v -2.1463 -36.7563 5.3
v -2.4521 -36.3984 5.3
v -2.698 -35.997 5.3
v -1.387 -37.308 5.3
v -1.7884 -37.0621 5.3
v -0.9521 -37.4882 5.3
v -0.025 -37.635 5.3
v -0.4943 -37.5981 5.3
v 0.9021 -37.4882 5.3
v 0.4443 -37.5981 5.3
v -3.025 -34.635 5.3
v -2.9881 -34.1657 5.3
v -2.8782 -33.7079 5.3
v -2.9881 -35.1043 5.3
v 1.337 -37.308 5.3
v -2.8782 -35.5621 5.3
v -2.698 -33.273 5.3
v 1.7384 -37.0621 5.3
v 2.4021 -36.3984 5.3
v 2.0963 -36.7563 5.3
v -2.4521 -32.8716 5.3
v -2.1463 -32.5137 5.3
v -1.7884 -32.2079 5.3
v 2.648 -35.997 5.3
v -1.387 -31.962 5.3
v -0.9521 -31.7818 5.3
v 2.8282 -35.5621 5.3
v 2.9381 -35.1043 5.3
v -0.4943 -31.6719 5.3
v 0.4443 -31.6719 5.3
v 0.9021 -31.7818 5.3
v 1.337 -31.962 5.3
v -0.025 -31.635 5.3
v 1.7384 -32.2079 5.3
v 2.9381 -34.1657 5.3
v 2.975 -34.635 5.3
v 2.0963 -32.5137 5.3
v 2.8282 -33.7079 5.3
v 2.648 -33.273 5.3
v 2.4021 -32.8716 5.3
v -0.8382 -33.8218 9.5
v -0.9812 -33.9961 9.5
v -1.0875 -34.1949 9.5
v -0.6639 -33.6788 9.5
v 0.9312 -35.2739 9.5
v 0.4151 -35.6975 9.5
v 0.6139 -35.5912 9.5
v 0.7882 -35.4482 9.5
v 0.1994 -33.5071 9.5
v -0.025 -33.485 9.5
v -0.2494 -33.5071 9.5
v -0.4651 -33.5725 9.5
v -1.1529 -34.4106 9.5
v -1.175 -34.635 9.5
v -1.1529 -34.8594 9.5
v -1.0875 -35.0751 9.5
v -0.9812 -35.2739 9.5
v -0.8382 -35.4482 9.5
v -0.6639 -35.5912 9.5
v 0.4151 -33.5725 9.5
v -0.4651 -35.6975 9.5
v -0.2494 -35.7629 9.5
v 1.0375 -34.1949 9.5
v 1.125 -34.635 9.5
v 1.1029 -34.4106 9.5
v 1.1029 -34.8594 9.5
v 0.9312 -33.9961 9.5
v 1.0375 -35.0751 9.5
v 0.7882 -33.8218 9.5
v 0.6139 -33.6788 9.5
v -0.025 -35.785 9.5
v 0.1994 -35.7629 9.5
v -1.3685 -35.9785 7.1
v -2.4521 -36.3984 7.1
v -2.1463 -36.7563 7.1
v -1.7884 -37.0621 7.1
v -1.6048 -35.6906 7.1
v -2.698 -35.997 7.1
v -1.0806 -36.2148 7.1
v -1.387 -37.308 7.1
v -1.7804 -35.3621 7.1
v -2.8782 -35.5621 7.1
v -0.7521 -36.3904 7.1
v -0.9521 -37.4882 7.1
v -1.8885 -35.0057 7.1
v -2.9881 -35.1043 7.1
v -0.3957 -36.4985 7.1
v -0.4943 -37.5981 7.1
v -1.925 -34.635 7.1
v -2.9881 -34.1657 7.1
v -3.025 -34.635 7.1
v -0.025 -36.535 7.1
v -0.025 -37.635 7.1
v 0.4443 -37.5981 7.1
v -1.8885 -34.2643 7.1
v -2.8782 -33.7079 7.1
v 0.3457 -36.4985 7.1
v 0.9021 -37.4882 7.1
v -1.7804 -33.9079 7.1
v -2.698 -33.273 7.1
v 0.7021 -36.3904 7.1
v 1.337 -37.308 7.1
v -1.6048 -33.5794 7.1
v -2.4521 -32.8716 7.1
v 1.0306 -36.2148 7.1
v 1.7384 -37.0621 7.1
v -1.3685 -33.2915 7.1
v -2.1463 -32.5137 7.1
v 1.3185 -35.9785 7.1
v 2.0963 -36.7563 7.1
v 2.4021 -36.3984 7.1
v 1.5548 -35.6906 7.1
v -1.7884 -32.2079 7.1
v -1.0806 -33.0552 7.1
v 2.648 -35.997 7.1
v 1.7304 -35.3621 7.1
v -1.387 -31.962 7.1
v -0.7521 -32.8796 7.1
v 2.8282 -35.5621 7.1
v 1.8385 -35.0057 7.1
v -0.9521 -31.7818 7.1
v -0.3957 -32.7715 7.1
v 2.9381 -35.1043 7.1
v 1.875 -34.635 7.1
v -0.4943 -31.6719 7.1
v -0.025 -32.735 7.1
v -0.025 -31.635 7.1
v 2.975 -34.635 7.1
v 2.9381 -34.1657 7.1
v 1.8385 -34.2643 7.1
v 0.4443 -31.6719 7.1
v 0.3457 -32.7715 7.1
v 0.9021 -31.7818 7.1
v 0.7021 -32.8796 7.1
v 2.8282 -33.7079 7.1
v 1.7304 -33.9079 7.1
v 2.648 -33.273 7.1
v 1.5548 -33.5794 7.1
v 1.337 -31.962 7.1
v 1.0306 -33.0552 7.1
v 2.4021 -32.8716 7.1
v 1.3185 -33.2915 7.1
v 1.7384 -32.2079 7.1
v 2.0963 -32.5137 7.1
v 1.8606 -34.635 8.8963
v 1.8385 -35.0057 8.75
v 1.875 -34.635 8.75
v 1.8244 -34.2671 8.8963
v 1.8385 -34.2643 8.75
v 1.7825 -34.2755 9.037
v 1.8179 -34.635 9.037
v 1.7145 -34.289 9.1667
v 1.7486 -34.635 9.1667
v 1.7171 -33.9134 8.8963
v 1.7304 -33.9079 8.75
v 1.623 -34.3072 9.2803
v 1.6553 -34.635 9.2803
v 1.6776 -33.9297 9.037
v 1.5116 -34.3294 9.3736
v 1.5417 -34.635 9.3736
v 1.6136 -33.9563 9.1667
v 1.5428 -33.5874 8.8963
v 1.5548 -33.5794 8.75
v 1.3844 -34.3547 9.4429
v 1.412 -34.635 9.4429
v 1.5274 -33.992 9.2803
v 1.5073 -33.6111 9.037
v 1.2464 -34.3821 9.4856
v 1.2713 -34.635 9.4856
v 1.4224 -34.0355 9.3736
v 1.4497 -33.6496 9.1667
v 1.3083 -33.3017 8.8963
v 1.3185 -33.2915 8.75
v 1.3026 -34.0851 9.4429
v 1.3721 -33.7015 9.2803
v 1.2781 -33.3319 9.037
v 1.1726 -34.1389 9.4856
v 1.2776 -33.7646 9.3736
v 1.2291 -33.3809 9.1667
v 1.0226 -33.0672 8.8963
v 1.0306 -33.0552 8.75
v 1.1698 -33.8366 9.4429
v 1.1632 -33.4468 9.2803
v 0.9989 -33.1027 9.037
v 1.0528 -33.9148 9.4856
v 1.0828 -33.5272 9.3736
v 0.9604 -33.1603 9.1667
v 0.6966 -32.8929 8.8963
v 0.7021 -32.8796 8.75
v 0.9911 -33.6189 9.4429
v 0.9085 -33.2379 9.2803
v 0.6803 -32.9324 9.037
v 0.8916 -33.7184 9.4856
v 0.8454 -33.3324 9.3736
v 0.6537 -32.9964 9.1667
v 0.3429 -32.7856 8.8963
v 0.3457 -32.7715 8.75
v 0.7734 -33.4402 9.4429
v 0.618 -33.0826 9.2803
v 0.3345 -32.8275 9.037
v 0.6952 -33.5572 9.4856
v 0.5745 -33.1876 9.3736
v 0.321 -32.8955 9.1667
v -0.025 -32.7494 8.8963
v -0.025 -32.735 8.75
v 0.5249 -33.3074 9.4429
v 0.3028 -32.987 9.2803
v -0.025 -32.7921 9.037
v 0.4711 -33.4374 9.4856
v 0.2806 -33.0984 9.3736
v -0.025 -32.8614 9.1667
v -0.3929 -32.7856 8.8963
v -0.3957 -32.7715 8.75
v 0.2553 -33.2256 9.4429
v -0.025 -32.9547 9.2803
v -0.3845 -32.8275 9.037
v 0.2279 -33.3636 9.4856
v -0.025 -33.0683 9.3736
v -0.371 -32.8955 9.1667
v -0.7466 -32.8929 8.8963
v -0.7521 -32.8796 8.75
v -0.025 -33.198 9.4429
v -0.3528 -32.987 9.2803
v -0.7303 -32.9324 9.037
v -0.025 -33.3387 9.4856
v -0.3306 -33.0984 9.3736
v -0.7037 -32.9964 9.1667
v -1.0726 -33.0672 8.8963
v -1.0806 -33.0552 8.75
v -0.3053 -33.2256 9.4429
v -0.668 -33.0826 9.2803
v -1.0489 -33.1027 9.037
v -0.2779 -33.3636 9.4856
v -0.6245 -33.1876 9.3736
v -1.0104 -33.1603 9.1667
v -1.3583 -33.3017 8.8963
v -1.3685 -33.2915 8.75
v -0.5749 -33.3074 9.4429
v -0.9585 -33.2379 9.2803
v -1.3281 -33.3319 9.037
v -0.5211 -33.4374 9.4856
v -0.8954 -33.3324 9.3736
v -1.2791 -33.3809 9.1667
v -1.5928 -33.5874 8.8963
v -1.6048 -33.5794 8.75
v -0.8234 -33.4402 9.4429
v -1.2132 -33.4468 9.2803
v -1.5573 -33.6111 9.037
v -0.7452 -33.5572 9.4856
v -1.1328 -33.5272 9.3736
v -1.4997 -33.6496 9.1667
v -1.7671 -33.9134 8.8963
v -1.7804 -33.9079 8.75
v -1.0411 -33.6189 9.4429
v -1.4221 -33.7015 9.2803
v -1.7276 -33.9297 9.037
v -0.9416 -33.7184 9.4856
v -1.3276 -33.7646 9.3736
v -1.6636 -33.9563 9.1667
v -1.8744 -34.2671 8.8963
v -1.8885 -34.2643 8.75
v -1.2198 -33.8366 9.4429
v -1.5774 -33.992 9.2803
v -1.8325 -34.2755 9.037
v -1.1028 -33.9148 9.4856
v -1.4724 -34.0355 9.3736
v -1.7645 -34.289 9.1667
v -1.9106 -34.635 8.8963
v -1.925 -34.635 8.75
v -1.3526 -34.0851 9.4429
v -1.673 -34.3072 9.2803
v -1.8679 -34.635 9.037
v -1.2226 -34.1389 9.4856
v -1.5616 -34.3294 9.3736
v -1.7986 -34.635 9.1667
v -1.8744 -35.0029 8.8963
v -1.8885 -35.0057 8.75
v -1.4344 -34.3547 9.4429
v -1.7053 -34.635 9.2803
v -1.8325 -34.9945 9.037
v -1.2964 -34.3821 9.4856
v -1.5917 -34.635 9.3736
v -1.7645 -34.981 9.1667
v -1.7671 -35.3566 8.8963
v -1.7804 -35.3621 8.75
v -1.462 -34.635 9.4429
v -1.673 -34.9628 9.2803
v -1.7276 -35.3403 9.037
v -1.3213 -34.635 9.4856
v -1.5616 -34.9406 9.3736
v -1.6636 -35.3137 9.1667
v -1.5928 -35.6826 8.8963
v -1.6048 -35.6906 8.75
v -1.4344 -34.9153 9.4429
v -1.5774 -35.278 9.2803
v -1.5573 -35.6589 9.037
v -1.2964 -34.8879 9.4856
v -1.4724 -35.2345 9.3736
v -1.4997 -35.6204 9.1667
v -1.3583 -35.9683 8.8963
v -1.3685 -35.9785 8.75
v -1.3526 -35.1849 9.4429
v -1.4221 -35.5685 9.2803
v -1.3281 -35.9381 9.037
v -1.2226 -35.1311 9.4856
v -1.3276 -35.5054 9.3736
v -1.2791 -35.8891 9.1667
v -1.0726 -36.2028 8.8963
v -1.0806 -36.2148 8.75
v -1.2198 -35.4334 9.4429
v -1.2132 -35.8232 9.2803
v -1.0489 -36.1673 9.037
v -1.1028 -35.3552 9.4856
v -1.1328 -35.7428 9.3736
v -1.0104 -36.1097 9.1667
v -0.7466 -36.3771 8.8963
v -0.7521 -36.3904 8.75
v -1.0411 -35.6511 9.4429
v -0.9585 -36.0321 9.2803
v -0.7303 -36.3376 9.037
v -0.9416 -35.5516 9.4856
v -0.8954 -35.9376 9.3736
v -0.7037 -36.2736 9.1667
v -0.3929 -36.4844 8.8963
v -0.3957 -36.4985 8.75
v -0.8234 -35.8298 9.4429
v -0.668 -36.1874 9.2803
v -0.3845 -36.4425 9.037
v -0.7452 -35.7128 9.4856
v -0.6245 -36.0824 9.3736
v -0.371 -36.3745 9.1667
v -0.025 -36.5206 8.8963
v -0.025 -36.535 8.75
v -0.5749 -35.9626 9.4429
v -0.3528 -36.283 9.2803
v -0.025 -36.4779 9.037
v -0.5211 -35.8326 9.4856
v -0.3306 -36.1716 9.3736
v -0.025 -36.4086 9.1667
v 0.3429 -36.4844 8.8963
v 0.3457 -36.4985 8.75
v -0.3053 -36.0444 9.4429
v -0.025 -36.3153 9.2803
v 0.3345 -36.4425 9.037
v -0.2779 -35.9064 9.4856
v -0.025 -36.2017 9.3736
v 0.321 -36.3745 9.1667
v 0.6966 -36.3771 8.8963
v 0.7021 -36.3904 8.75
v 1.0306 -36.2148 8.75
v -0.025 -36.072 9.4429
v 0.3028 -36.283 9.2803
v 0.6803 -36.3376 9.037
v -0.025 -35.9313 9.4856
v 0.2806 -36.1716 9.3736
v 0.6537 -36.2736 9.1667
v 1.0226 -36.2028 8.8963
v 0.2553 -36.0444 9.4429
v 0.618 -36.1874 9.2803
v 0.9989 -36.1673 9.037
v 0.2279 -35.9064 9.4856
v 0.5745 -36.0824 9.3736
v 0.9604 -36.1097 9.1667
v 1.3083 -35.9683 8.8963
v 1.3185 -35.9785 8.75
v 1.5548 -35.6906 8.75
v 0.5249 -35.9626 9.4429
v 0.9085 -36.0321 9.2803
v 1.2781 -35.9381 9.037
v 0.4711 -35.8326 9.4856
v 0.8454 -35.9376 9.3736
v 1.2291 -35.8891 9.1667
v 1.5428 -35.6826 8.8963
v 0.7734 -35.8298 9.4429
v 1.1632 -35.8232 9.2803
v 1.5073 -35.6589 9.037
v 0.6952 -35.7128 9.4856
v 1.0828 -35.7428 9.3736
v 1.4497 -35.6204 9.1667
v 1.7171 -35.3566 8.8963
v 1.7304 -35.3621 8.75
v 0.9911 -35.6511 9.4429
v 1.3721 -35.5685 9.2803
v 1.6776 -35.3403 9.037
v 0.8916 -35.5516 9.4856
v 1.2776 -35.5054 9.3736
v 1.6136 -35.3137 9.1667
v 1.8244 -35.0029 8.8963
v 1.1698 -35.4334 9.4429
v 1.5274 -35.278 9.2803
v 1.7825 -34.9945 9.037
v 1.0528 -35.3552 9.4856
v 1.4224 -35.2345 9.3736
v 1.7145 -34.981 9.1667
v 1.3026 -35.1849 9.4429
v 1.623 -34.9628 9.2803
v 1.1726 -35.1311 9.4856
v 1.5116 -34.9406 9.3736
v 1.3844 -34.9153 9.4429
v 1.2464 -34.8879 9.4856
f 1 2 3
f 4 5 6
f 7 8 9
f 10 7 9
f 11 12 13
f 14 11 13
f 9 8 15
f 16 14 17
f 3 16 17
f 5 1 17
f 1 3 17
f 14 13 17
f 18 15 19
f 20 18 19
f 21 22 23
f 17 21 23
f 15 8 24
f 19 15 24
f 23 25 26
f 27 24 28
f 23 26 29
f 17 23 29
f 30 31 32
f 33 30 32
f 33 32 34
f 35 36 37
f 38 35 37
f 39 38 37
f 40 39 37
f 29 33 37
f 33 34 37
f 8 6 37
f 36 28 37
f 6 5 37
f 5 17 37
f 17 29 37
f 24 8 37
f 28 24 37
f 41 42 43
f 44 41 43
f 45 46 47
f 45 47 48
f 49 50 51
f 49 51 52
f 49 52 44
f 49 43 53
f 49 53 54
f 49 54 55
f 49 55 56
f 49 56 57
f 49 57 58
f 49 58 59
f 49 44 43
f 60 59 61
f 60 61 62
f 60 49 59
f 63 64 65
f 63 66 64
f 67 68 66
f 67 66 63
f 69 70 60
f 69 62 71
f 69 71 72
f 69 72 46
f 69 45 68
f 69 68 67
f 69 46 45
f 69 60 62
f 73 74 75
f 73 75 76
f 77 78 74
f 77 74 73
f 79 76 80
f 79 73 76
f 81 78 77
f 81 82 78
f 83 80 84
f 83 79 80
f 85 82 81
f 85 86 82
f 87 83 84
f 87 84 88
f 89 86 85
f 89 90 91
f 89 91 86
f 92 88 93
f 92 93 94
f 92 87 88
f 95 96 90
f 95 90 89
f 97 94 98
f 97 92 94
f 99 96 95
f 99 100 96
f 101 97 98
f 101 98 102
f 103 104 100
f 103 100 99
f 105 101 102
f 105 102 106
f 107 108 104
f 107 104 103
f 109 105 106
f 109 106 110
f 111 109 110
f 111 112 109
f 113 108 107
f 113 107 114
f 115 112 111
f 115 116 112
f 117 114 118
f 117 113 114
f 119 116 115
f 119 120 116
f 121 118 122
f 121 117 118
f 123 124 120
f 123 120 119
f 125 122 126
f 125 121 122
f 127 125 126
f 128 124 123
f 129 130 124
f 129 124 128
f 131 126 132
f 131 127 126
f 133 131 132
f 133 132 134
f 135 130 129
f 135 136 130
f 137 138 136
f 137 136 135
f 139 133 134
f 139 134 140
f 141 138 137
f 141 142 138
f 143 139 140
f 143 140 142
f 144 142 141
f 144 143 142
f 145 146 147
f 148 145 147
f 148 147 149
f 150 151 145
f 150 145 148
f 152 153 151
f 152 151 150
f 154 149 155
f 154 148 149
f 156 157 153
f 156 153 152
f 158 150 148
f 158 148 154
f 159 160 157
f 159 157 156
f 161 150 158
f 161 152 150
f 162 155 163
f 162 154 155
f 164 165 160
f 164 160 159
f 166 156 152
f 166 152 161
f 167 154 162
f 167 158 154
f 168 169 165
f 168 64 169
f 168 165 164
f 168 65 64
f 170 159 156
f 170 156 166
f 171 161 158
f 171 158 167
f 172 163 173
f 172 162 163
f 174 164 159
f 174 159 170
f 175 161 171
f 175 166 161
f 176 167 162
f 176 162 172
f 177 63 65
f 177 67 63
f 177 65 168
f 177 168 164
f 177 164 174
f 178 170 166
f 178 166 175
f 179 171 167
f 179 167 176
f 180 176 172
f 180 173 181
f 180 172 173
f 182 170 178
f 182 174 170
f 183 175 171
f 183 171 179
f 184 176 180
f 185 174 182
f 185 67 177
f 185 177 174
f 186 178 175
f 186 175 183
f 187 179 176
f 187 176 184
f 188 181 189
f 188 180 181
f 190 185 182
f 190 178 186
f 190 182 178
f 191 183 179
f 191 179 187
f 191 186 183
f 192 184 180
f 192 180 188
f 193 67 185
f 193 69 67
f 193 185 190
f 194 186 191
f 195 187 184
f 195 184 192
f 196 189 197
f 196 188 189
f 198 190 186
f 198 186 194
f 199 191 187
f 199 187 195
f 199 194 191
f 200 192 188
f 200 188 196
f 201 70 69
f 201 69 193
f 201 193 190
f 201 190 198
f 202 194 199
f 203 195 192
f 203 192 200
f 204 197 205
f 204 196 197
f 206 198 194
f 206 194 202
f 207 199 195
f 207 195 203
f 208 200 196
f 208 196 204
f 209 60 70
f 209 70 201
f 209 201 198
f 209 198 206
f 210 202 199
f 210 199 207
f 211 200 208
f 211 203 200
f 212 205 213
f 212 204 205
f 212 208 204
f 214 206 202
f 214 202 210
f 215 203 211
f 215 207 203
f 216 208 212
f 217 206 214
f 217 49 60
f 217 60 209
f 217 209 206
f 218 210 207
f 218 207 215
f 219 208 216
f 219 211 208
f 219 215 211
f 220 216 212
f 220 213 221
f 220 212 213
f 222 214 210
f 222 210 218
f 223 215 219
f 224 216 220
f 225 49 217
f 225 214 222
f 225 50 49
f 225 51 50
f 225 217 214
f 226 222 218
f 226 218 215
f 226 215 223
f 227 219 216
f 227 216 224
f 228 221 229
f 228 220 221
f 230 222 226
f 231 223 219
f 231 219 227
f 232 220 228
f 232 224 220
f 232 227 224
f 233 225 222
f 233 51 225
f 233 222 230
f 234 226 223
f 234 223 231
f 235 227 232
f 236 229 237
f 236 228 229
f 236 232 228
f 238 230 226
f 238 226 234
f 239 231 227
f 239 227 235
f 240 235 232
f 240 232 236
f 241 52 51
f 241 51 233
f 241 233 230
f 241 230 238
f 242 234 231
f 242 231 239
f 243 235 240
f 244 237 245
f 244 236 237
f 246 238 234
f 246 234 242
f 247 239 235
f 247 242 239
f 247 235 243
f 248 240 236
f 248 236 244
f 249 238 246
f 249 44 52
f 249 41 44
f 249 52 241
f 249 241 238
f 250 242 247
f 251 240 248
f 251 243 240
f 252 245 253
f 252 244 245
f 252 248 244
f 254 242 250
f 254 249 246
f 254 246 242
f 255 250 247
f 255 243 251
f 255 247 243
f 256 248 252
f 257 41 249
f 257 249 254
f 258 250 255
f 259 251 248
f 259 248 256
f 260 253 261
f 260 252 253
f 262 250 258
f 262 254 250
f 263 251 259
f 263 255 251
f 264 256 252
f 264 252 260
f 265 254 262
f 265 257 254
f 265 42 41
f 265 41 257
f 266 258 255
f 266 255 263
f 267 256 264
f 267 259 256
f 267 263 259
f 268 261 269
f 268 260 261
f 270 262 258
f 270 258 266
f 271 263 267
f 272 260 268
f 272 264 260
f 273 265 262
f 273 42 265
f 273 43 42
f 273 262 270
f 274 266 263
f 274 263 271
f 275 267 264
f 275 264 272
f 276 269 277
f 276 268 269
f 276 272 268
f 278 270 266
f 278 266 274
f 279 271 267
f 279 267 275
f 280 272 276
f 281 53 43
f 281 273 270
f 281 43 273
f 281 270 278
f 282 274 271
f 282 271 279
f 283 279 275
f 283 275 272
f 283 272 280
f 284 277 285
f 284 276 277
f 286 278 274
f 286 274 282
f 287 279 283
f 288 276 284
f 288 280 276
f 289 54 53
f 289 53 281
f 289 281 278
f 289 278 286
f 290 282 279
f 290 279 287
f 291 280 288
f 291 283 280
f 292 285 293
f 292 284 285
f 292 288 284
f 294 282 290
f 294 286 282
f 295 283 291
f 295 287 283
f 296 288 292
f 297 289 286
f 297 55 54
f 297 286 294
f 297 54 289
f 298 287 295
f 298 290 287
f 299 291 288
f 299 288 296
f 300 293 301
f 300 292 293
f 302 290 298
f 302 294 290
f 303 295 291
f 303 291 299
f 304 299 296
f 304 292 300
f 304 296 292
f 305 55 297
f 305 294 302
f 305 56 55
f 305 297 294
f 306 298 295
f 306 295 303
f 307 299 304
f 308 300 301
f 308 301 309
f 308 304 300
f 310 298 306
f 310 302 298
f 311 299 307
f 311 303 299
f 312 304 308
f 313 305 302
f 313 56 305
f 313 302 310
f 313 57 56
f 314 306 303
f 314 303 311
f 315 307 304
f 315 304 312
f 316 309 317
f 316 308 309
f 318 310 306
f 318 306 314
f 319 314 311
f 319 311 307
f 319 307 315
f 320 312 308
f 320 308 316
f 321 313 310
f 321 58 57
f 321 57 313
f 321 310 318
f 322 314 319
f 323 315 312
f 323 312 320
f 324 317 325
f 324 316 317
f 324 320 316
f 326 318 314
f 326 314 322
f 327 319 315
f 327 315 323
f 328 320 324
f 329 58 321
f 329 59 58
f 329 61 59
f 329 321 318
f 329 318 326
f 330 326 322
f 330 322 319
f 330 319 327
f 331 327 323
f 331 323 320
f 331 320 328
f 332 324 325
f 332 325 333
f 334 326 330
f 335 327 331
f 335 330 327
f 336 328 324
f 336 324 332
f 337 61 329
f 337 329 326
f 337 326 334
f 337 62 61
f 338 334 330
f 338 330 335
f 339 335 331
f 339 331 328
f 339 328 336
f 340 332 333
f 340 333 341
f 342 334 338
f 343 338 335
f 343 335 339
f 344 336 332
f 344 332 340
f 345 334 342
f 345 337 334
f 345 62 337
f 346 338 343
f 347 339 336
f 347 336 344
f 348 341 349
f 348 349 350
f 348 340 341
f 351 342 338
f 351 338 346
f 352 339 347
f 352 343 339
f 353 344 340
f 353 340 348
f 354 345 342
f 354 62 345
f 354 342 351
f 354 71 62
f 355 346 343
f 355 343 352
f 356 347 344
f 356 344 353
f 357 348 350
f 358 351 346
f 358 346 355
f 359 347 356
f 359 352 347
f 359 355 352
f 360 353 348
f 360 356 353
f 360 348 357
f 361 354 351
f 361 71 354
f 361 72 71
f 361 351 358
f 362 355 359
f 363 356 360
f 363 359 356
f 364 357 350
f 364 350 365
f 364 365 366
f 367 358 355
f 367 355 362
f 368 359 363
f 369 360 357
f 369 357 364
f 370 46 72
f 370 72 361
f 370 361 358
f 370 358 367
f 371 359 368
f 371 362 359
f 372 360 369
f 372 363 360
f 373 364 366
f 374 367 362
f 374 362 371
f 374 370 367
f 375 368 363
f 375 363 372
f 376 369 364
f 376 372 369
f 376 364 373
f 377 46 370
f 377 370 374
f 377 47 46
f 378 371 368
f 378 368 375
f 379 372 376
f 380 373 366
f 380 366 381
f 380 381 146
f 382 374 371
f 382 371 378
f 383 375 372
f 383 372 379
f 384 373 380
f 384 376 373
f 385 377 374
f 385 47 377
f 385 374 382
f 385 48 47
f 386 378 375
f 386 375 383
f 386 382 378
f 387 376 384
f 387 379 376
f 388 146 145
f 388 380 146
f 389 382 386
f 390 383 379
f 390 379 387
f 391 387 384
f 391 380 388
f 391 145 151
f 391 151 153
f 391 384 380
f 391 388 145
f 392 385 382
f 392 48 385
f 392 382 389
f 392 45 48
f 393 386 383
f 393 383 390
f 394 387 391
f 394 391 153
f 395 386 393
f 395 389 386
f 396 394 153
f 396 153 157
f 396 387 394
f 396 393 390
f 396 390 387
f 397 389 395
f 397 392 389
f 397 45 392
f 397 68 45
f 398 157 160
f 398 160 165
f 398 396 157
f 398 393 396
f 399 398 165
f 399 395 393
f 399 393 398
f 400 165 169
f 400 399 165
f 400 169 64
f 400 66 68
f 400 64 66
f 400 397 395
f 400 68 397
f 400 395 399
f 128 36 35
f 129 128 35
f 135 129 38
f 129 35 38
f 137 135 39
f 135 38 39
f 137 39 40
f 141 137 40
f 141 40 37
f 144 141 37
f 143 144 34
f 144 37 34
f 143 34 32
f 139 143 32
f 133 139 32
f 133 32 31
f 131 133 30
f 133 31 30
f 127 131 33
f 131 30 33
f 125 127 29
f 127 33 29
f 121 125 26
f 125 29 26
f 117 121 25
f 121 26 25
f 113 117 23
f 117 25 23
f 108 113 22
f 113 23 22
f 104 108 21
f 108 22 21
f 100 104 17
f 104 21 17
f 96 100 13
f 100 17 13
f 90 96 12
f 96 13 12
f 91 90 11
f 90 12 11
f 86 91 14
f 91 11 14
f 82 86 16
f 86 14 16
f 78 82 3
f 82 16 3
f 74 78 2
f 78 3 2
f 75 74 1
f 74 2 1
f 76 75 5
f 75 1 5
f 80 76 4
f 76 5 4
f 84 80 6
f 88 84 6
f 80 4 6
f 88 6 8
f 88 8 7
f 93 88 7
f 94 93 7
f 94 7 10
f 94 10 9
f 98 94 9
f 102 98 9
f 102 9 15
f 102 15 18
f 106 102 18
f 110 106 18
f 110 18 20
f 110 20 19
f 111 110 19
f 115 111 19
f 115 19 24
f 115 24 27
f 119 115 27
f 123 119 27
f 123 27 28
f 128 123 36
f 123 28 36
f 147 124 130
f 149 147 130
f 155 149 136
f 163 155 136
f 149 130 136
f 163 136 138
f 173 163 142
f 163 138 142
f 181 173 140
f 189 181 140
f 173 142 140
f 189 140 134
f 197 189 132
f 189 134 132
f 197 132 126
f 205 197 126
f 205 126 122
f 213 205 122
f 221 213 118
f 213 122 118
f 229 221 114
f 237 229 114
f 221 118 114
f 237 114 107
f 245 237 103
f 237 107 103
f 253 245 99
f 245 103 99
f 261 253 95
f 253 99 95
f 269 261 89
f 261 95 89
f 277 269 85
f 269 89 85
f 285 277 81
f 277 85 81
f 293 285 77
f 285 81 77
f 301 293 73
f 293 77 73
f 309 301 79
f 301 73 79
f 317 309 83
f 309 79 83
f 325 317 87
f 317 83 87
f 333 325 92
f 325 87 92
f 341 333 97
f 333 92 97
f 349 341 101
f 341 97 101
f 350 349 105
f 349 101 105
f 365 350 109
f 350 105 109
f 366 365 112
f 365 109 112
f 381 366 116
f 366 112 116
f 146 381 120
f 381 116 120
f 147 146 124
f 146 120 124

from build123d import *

# Parameters (mm, degrees)
CYLINDER007_R     = 1.9
CYLINDER007_DEPTH = 2.4
CYLINDER006_R     = 3
CYLINDER006_DEPTH = 1.8
FILLET004_R       = 0.75


with BuildPart() as cylinder011:
    # Cylinder007 → Cylinder007 (new body)
    with BuildSketch(Plane.XY.offset(1.5)):
        Circle(CYLINDER007_R)
    extrude(amount=CYLINDER007_DEPTH)


with BuildPart() as tecla_reset:
    # Cylinder006 → Cylinder006 (new body)
    with BuildSketch(Plane.XY.offset(-0.3)):
        Circle(CYLINDER006_R)
    extrude(amount=CYLINDER006_DEPTH)

    # Fusion017: union Cylinder011
    add(cylinder011.part)

    # Fillet004
    fillet004_edges = [tecla_reset.edges().sort_by_distance(p)[0] for p in [
        (-1.9, 0, 3.9),
    ]]
    fillet(fillet004_edges, radius=FILLET004_R)


with BuildPart() as tecla_reset_1:
    # Fillet004 placement: moved
    add(tecla_reset.part.moved(Location((-0.025, -34.635, 5.6))))


solid = tecla_reset_1.part
